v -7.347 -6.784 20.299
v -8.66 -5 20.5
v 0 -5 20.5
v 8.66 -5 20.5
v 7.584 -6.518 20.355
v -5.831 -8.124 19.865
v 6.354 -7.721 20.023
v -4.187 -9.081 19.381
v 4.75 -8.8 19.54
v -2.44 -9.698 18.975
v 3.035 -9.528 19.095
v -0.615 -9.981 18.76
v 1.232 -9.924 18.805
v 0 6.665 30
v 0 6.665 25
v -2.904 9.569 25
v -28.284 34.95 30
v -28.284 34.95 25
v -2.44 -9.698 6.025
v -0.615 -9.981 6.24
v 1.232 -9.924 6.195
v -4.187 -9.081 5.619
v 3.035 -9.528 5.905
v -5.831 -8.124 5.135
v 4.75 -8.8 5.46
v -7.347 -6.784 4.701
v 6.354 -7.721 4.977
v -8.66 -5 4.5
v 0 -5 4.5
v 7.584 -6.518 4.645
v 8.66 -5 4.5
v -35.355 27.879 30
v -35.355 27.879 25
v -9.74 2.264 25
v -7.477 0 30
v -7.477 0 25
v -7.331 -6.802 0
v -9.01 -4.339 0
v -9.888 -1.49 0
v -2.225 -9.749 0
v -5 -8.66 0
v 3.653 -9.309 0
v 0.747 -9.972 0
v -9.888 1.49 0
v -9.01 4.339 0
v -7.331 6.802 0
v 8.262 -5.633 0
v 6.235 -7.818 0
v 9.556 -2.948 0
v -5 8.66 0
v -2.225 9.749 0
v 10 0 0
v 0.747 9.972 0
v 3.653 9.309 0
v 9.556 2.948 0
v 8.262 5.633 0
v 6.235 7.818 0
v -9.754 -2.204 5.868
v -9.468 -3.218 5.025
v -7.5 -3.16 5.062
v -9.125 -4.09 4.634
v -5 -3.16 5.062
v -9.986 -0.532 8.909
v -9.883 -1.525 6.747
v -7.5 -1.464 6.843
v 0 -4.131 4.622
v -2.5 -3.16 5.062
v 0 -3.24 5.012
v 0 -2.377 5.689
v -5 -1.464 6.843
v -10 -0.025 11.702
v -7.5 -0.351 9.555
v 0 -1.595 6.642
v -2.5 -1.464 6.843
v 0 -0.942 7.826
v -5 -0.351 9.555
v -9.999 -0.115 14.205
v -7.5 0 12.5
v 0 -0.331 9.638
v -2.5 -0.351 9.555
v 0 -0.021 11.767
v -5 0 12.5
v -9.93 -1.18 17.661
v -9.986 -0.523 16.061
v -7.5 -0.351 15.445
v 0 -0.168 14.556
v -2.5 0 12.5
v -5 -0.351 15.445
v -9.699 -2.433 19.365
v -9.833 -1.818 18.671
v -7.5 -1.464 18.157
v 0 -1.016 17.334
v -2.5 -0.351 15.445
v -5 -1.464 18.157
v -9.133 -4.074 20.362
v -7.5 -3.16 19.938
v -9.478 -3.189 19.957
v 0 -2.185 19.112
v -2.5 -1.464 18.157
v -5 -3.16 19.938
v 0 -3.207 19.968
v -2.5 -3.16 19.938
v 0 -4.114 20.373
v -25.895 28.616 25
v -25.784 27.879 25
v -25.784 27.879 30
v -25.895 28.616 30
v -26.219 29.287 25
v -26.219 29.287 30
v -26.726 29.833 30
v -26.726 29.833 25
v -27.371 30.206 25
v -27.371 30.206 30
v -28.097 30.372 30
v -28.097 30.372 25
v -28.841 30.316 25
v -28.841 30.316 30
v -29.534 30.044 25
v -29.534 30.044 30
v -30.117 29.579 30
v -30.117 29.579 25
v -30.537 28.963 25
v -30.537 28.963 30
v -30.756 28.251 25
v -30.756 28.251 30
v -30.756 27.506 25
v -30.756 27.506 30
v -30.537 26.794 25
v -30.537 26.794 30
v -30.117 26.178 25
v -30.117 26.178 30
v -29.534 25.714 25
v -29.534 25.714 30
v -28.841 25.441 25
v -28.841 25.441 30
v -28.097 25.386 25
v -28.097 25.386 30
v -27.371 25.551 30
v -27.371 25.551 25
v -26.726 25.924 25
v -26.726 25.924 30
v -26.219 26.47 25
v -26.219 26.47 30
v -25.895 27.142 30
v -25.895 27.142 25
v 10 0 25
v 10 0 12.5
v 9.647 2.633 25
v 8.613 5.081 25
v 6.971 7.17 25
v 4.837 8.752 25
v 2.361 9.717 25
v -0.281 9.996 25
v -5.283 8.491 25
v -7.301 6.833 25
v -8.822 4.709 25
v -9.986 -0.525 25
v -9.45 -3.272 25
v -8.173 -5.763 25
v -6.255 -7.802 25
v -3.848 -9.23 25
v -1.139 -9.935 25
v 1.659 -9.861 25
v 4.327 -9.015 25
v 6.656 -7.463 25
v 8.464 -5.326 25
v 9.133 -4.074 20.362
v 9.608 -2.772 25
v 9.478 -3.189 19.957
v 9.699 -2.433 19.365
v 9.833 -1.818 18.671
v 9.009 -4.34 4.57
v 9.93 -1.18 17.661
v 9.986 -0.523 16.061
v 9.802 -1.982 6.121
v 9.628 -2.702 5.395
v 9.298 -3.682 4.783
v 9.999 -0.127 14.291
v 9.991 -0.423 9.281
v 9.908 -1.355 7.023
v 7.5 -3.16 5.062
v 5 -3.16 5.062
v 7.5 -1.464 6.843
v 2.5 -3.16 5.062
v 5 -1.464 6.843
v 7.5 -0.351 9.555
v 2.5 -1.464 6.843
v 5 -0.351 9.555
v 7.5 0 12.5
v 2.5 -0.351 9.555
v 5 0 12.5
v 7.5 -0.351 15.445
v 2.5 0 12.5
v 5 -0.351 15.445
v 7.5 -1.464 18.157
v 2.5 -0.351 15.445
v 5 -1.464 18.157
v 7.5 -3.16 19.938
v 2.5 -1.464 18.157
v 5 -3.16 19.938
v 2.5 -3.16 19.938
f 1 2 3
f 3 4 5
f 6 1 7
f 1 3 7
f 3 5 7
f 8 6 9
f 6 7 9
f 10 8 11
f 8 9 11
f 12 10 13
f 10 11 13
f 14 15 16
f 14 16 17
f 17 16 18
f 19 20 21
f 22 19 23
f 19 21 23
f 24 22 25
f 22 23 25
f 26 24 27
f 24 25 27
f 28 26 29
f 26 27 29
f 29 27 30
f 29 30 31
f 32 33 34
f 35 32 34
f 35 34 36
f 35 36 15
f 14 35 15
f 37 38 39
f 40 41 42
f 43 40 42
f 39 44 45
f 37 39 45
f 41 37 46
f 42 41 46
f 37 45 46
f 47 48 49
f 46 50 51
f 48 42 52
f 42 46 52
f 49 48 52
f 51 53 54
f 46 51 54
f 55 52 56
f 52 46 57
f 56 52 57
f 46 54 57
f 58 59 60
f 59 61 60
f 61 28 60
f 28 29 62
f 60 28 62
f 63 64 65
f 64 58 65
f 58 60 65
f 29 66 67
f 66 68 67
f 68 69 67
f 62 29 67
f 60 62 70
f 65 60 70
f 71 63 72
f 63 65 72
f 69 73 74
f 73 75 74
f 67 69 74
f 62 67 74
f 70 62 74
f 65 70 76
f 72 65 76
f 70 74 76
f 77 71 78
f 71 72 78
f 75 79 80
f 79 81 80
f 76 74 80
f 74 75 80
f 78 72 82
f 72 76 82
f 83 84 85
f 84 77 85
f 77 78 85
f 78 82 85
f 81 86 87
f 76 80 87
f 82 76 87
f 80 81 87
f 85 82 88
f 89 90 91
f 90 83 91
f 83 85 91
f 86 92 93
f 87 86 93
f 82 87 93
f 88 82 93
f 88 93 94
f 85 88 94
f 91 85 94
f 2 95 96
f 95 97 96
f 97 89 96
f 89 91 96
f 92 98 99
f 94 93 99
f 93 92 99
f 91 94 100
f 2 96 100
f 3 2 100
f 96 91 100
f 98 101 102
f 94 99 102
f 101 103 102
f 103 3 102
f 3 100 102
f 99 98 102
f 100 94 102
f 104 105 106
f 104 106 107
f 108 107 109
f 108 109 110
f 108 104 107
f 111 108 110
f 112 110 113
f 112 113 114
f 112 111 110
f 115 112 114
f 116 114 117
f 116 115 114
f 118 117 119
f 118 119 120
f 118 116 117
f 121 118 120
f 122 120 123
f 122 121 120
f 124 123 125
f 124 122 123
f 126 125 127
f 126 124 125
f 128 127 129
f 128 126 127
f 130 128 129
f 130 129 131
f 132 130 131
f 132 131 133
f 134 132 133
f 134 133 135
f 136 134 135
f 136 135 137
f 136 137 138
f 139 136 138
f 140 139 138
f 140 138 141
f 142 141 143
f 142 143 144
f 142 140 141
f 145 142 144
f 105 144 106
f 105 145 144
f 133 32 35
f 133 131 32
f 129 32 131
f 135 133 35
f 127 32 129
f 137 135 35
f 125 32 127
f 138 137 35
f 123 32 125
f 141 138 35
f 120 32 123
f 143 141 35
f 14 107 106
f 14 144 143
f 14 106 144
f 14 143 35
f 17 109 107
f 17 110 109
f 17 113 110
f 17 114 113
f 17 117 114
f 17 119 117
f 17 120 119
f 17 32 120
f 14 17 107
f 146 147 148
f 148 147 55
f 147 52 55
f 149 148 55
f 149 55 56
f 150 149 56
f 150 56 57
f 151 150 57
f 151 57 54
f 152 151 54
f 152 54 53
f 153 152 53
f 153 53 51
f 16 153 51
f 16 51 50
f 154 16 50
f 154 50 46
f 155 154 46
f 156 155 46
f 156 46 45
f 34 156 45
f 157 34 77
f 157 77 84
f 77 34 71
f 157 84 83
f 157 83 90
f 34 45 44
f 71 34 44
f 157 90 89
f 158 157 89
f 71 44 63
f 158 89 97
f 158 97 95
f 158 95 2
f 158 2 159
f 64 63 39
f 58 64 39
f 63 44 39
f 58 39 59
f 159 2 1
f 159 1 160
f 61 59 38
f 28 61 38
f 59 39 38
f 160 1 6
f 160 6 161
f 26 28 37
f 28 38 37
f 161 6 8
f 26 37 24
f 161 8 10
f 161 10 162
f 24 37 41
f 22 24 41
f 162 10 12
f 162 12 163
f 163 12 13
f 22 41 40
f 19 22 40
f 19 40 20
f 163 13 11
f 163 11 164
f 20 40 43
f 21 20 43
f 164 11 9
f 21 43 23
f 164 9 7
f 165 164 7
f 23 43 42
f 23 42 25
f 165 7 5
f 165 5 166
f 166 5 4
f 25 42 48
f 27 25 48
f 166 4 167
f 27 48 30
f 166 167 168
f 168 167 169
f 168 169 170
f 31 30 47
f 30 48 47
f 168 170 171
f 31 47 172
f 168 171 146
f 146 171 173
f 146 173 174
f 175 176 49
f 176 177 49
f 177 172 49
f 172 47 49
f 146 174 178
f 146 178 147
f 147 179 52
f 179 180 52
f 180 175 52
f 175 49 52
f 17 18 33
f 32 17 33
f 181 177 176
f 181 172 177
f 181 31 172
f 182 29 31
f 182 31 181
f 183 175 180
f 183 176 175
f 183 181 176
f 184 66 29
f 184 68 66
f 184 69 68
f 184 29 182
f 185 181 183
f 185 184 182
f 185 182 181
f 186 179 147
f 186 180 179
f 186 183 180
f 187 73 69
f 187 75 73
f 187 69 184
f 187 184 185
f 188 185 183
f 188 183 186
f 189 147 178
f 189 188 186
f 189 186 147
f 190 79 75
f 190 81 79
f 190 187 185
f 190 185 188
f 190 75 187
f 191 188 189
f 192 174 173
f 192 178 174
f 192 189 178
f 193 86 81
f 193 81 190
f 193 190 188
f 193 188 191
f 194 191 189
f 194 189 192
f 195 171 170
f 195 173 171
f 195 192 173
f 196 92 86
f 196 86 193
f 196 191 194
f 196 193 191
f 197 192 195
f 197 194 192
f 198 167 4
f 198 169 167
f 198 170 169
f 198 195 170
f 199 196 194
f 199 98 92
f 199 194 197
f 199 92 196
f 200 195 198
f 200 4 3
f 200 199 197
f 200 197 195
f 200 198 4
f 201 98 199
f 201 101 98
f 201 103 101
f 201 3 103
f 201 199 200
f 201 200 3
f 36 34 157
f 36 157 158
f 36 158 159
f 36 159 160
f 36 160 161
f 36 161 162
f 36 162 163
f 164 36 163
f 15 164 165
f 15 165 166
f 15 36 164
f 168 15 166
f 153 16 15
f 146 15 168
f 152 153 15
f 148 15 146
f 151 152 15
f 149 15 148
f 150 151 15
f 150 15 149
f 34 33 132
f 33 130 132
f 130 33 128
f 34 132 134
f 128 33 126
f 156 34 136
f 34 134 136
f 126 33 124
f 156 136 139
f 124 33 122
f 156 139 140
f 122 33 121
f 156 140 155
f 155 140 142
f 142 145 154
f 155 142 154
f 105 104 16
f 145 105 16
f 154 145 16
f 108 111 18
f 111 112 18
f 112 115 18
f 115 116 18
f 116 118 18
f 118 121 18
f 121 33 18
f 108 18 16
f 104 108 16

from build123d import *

# Parameters (mm, degrees)
F0_R     = 10
F1_DEPTH = 25
F3_DEPTH = 12.5
F5_R     = 2.5
F6_DEPTH = 5


with BuildPart() as f1:
    # F0 (on Top) → F1 (new body)
    with BuildSketch(Plane.XY):
        Circle(F0_R)
    extrude(amount=F1_DEPTH)

    # F2 (on Right) → F3 (cut, symmetric)
    with BuildSketch(Plane.YZ):
        with BuildLine():
            add(Edge.make_bspline(
                [(-5, 4.5), (0, 4.5), (0, 12.5), (0, 20.5), (-5, 20.5)],
                knots=[3.141593, 3.141593, 3.141593, 4.712389, 4.712389, 6.283185, 6.283185, 6.283185], degree=2, weights=[1, 0.707107, 1, 0.707107, 1]))
            add(Edge.make_bspline(
                [(-5, 20.5), (-10, 20.5), (-10, 12.5), (-10, 4.5), (-5, 4.5)],
                knots=[0, 0, 0, 1.570796, 1.570796, 3.141593, 3.141593, 3.141593], degree=2, weights=[1, 0.707107, 1, 0.707107, 1]))
        make_face()
        with BuildLine():
            add(Edge.make_bspline(
                [(-5, 20.5), (-10, 20.5), (-10, 12.5), (-10, 4.5), (-5, 4.5)],
                knots=[0, 0, 0, 1.570796, 1.570796, 3.141593, 3.141593, 3.141593], degree=2, weights=[1, 0.707107, 1, 0.707107, 1]))
            ThreePointArc((-5, 20.5), (-13, 12.5), (-5, 4.5))
        make_face()
    extrude(amount=F3_DEPTH, both=True, mode=Mode.SUBTRACT)

    # F5 (on face) → F6 (join)
    with BuildSketch(Plane.XY.offset(25)):
        Polygon((-7.476686, 0), (0, 6.66545), (-28.284271, 34.949721), (-35.355339, 27.878653), align=None)
        with Locations((-28.284271, 27.878653)):
            Circle(F5_R, mode=Mode.SUBTRACT)
    extrude(amount=F6_DEPTH)


solid = f1.part
